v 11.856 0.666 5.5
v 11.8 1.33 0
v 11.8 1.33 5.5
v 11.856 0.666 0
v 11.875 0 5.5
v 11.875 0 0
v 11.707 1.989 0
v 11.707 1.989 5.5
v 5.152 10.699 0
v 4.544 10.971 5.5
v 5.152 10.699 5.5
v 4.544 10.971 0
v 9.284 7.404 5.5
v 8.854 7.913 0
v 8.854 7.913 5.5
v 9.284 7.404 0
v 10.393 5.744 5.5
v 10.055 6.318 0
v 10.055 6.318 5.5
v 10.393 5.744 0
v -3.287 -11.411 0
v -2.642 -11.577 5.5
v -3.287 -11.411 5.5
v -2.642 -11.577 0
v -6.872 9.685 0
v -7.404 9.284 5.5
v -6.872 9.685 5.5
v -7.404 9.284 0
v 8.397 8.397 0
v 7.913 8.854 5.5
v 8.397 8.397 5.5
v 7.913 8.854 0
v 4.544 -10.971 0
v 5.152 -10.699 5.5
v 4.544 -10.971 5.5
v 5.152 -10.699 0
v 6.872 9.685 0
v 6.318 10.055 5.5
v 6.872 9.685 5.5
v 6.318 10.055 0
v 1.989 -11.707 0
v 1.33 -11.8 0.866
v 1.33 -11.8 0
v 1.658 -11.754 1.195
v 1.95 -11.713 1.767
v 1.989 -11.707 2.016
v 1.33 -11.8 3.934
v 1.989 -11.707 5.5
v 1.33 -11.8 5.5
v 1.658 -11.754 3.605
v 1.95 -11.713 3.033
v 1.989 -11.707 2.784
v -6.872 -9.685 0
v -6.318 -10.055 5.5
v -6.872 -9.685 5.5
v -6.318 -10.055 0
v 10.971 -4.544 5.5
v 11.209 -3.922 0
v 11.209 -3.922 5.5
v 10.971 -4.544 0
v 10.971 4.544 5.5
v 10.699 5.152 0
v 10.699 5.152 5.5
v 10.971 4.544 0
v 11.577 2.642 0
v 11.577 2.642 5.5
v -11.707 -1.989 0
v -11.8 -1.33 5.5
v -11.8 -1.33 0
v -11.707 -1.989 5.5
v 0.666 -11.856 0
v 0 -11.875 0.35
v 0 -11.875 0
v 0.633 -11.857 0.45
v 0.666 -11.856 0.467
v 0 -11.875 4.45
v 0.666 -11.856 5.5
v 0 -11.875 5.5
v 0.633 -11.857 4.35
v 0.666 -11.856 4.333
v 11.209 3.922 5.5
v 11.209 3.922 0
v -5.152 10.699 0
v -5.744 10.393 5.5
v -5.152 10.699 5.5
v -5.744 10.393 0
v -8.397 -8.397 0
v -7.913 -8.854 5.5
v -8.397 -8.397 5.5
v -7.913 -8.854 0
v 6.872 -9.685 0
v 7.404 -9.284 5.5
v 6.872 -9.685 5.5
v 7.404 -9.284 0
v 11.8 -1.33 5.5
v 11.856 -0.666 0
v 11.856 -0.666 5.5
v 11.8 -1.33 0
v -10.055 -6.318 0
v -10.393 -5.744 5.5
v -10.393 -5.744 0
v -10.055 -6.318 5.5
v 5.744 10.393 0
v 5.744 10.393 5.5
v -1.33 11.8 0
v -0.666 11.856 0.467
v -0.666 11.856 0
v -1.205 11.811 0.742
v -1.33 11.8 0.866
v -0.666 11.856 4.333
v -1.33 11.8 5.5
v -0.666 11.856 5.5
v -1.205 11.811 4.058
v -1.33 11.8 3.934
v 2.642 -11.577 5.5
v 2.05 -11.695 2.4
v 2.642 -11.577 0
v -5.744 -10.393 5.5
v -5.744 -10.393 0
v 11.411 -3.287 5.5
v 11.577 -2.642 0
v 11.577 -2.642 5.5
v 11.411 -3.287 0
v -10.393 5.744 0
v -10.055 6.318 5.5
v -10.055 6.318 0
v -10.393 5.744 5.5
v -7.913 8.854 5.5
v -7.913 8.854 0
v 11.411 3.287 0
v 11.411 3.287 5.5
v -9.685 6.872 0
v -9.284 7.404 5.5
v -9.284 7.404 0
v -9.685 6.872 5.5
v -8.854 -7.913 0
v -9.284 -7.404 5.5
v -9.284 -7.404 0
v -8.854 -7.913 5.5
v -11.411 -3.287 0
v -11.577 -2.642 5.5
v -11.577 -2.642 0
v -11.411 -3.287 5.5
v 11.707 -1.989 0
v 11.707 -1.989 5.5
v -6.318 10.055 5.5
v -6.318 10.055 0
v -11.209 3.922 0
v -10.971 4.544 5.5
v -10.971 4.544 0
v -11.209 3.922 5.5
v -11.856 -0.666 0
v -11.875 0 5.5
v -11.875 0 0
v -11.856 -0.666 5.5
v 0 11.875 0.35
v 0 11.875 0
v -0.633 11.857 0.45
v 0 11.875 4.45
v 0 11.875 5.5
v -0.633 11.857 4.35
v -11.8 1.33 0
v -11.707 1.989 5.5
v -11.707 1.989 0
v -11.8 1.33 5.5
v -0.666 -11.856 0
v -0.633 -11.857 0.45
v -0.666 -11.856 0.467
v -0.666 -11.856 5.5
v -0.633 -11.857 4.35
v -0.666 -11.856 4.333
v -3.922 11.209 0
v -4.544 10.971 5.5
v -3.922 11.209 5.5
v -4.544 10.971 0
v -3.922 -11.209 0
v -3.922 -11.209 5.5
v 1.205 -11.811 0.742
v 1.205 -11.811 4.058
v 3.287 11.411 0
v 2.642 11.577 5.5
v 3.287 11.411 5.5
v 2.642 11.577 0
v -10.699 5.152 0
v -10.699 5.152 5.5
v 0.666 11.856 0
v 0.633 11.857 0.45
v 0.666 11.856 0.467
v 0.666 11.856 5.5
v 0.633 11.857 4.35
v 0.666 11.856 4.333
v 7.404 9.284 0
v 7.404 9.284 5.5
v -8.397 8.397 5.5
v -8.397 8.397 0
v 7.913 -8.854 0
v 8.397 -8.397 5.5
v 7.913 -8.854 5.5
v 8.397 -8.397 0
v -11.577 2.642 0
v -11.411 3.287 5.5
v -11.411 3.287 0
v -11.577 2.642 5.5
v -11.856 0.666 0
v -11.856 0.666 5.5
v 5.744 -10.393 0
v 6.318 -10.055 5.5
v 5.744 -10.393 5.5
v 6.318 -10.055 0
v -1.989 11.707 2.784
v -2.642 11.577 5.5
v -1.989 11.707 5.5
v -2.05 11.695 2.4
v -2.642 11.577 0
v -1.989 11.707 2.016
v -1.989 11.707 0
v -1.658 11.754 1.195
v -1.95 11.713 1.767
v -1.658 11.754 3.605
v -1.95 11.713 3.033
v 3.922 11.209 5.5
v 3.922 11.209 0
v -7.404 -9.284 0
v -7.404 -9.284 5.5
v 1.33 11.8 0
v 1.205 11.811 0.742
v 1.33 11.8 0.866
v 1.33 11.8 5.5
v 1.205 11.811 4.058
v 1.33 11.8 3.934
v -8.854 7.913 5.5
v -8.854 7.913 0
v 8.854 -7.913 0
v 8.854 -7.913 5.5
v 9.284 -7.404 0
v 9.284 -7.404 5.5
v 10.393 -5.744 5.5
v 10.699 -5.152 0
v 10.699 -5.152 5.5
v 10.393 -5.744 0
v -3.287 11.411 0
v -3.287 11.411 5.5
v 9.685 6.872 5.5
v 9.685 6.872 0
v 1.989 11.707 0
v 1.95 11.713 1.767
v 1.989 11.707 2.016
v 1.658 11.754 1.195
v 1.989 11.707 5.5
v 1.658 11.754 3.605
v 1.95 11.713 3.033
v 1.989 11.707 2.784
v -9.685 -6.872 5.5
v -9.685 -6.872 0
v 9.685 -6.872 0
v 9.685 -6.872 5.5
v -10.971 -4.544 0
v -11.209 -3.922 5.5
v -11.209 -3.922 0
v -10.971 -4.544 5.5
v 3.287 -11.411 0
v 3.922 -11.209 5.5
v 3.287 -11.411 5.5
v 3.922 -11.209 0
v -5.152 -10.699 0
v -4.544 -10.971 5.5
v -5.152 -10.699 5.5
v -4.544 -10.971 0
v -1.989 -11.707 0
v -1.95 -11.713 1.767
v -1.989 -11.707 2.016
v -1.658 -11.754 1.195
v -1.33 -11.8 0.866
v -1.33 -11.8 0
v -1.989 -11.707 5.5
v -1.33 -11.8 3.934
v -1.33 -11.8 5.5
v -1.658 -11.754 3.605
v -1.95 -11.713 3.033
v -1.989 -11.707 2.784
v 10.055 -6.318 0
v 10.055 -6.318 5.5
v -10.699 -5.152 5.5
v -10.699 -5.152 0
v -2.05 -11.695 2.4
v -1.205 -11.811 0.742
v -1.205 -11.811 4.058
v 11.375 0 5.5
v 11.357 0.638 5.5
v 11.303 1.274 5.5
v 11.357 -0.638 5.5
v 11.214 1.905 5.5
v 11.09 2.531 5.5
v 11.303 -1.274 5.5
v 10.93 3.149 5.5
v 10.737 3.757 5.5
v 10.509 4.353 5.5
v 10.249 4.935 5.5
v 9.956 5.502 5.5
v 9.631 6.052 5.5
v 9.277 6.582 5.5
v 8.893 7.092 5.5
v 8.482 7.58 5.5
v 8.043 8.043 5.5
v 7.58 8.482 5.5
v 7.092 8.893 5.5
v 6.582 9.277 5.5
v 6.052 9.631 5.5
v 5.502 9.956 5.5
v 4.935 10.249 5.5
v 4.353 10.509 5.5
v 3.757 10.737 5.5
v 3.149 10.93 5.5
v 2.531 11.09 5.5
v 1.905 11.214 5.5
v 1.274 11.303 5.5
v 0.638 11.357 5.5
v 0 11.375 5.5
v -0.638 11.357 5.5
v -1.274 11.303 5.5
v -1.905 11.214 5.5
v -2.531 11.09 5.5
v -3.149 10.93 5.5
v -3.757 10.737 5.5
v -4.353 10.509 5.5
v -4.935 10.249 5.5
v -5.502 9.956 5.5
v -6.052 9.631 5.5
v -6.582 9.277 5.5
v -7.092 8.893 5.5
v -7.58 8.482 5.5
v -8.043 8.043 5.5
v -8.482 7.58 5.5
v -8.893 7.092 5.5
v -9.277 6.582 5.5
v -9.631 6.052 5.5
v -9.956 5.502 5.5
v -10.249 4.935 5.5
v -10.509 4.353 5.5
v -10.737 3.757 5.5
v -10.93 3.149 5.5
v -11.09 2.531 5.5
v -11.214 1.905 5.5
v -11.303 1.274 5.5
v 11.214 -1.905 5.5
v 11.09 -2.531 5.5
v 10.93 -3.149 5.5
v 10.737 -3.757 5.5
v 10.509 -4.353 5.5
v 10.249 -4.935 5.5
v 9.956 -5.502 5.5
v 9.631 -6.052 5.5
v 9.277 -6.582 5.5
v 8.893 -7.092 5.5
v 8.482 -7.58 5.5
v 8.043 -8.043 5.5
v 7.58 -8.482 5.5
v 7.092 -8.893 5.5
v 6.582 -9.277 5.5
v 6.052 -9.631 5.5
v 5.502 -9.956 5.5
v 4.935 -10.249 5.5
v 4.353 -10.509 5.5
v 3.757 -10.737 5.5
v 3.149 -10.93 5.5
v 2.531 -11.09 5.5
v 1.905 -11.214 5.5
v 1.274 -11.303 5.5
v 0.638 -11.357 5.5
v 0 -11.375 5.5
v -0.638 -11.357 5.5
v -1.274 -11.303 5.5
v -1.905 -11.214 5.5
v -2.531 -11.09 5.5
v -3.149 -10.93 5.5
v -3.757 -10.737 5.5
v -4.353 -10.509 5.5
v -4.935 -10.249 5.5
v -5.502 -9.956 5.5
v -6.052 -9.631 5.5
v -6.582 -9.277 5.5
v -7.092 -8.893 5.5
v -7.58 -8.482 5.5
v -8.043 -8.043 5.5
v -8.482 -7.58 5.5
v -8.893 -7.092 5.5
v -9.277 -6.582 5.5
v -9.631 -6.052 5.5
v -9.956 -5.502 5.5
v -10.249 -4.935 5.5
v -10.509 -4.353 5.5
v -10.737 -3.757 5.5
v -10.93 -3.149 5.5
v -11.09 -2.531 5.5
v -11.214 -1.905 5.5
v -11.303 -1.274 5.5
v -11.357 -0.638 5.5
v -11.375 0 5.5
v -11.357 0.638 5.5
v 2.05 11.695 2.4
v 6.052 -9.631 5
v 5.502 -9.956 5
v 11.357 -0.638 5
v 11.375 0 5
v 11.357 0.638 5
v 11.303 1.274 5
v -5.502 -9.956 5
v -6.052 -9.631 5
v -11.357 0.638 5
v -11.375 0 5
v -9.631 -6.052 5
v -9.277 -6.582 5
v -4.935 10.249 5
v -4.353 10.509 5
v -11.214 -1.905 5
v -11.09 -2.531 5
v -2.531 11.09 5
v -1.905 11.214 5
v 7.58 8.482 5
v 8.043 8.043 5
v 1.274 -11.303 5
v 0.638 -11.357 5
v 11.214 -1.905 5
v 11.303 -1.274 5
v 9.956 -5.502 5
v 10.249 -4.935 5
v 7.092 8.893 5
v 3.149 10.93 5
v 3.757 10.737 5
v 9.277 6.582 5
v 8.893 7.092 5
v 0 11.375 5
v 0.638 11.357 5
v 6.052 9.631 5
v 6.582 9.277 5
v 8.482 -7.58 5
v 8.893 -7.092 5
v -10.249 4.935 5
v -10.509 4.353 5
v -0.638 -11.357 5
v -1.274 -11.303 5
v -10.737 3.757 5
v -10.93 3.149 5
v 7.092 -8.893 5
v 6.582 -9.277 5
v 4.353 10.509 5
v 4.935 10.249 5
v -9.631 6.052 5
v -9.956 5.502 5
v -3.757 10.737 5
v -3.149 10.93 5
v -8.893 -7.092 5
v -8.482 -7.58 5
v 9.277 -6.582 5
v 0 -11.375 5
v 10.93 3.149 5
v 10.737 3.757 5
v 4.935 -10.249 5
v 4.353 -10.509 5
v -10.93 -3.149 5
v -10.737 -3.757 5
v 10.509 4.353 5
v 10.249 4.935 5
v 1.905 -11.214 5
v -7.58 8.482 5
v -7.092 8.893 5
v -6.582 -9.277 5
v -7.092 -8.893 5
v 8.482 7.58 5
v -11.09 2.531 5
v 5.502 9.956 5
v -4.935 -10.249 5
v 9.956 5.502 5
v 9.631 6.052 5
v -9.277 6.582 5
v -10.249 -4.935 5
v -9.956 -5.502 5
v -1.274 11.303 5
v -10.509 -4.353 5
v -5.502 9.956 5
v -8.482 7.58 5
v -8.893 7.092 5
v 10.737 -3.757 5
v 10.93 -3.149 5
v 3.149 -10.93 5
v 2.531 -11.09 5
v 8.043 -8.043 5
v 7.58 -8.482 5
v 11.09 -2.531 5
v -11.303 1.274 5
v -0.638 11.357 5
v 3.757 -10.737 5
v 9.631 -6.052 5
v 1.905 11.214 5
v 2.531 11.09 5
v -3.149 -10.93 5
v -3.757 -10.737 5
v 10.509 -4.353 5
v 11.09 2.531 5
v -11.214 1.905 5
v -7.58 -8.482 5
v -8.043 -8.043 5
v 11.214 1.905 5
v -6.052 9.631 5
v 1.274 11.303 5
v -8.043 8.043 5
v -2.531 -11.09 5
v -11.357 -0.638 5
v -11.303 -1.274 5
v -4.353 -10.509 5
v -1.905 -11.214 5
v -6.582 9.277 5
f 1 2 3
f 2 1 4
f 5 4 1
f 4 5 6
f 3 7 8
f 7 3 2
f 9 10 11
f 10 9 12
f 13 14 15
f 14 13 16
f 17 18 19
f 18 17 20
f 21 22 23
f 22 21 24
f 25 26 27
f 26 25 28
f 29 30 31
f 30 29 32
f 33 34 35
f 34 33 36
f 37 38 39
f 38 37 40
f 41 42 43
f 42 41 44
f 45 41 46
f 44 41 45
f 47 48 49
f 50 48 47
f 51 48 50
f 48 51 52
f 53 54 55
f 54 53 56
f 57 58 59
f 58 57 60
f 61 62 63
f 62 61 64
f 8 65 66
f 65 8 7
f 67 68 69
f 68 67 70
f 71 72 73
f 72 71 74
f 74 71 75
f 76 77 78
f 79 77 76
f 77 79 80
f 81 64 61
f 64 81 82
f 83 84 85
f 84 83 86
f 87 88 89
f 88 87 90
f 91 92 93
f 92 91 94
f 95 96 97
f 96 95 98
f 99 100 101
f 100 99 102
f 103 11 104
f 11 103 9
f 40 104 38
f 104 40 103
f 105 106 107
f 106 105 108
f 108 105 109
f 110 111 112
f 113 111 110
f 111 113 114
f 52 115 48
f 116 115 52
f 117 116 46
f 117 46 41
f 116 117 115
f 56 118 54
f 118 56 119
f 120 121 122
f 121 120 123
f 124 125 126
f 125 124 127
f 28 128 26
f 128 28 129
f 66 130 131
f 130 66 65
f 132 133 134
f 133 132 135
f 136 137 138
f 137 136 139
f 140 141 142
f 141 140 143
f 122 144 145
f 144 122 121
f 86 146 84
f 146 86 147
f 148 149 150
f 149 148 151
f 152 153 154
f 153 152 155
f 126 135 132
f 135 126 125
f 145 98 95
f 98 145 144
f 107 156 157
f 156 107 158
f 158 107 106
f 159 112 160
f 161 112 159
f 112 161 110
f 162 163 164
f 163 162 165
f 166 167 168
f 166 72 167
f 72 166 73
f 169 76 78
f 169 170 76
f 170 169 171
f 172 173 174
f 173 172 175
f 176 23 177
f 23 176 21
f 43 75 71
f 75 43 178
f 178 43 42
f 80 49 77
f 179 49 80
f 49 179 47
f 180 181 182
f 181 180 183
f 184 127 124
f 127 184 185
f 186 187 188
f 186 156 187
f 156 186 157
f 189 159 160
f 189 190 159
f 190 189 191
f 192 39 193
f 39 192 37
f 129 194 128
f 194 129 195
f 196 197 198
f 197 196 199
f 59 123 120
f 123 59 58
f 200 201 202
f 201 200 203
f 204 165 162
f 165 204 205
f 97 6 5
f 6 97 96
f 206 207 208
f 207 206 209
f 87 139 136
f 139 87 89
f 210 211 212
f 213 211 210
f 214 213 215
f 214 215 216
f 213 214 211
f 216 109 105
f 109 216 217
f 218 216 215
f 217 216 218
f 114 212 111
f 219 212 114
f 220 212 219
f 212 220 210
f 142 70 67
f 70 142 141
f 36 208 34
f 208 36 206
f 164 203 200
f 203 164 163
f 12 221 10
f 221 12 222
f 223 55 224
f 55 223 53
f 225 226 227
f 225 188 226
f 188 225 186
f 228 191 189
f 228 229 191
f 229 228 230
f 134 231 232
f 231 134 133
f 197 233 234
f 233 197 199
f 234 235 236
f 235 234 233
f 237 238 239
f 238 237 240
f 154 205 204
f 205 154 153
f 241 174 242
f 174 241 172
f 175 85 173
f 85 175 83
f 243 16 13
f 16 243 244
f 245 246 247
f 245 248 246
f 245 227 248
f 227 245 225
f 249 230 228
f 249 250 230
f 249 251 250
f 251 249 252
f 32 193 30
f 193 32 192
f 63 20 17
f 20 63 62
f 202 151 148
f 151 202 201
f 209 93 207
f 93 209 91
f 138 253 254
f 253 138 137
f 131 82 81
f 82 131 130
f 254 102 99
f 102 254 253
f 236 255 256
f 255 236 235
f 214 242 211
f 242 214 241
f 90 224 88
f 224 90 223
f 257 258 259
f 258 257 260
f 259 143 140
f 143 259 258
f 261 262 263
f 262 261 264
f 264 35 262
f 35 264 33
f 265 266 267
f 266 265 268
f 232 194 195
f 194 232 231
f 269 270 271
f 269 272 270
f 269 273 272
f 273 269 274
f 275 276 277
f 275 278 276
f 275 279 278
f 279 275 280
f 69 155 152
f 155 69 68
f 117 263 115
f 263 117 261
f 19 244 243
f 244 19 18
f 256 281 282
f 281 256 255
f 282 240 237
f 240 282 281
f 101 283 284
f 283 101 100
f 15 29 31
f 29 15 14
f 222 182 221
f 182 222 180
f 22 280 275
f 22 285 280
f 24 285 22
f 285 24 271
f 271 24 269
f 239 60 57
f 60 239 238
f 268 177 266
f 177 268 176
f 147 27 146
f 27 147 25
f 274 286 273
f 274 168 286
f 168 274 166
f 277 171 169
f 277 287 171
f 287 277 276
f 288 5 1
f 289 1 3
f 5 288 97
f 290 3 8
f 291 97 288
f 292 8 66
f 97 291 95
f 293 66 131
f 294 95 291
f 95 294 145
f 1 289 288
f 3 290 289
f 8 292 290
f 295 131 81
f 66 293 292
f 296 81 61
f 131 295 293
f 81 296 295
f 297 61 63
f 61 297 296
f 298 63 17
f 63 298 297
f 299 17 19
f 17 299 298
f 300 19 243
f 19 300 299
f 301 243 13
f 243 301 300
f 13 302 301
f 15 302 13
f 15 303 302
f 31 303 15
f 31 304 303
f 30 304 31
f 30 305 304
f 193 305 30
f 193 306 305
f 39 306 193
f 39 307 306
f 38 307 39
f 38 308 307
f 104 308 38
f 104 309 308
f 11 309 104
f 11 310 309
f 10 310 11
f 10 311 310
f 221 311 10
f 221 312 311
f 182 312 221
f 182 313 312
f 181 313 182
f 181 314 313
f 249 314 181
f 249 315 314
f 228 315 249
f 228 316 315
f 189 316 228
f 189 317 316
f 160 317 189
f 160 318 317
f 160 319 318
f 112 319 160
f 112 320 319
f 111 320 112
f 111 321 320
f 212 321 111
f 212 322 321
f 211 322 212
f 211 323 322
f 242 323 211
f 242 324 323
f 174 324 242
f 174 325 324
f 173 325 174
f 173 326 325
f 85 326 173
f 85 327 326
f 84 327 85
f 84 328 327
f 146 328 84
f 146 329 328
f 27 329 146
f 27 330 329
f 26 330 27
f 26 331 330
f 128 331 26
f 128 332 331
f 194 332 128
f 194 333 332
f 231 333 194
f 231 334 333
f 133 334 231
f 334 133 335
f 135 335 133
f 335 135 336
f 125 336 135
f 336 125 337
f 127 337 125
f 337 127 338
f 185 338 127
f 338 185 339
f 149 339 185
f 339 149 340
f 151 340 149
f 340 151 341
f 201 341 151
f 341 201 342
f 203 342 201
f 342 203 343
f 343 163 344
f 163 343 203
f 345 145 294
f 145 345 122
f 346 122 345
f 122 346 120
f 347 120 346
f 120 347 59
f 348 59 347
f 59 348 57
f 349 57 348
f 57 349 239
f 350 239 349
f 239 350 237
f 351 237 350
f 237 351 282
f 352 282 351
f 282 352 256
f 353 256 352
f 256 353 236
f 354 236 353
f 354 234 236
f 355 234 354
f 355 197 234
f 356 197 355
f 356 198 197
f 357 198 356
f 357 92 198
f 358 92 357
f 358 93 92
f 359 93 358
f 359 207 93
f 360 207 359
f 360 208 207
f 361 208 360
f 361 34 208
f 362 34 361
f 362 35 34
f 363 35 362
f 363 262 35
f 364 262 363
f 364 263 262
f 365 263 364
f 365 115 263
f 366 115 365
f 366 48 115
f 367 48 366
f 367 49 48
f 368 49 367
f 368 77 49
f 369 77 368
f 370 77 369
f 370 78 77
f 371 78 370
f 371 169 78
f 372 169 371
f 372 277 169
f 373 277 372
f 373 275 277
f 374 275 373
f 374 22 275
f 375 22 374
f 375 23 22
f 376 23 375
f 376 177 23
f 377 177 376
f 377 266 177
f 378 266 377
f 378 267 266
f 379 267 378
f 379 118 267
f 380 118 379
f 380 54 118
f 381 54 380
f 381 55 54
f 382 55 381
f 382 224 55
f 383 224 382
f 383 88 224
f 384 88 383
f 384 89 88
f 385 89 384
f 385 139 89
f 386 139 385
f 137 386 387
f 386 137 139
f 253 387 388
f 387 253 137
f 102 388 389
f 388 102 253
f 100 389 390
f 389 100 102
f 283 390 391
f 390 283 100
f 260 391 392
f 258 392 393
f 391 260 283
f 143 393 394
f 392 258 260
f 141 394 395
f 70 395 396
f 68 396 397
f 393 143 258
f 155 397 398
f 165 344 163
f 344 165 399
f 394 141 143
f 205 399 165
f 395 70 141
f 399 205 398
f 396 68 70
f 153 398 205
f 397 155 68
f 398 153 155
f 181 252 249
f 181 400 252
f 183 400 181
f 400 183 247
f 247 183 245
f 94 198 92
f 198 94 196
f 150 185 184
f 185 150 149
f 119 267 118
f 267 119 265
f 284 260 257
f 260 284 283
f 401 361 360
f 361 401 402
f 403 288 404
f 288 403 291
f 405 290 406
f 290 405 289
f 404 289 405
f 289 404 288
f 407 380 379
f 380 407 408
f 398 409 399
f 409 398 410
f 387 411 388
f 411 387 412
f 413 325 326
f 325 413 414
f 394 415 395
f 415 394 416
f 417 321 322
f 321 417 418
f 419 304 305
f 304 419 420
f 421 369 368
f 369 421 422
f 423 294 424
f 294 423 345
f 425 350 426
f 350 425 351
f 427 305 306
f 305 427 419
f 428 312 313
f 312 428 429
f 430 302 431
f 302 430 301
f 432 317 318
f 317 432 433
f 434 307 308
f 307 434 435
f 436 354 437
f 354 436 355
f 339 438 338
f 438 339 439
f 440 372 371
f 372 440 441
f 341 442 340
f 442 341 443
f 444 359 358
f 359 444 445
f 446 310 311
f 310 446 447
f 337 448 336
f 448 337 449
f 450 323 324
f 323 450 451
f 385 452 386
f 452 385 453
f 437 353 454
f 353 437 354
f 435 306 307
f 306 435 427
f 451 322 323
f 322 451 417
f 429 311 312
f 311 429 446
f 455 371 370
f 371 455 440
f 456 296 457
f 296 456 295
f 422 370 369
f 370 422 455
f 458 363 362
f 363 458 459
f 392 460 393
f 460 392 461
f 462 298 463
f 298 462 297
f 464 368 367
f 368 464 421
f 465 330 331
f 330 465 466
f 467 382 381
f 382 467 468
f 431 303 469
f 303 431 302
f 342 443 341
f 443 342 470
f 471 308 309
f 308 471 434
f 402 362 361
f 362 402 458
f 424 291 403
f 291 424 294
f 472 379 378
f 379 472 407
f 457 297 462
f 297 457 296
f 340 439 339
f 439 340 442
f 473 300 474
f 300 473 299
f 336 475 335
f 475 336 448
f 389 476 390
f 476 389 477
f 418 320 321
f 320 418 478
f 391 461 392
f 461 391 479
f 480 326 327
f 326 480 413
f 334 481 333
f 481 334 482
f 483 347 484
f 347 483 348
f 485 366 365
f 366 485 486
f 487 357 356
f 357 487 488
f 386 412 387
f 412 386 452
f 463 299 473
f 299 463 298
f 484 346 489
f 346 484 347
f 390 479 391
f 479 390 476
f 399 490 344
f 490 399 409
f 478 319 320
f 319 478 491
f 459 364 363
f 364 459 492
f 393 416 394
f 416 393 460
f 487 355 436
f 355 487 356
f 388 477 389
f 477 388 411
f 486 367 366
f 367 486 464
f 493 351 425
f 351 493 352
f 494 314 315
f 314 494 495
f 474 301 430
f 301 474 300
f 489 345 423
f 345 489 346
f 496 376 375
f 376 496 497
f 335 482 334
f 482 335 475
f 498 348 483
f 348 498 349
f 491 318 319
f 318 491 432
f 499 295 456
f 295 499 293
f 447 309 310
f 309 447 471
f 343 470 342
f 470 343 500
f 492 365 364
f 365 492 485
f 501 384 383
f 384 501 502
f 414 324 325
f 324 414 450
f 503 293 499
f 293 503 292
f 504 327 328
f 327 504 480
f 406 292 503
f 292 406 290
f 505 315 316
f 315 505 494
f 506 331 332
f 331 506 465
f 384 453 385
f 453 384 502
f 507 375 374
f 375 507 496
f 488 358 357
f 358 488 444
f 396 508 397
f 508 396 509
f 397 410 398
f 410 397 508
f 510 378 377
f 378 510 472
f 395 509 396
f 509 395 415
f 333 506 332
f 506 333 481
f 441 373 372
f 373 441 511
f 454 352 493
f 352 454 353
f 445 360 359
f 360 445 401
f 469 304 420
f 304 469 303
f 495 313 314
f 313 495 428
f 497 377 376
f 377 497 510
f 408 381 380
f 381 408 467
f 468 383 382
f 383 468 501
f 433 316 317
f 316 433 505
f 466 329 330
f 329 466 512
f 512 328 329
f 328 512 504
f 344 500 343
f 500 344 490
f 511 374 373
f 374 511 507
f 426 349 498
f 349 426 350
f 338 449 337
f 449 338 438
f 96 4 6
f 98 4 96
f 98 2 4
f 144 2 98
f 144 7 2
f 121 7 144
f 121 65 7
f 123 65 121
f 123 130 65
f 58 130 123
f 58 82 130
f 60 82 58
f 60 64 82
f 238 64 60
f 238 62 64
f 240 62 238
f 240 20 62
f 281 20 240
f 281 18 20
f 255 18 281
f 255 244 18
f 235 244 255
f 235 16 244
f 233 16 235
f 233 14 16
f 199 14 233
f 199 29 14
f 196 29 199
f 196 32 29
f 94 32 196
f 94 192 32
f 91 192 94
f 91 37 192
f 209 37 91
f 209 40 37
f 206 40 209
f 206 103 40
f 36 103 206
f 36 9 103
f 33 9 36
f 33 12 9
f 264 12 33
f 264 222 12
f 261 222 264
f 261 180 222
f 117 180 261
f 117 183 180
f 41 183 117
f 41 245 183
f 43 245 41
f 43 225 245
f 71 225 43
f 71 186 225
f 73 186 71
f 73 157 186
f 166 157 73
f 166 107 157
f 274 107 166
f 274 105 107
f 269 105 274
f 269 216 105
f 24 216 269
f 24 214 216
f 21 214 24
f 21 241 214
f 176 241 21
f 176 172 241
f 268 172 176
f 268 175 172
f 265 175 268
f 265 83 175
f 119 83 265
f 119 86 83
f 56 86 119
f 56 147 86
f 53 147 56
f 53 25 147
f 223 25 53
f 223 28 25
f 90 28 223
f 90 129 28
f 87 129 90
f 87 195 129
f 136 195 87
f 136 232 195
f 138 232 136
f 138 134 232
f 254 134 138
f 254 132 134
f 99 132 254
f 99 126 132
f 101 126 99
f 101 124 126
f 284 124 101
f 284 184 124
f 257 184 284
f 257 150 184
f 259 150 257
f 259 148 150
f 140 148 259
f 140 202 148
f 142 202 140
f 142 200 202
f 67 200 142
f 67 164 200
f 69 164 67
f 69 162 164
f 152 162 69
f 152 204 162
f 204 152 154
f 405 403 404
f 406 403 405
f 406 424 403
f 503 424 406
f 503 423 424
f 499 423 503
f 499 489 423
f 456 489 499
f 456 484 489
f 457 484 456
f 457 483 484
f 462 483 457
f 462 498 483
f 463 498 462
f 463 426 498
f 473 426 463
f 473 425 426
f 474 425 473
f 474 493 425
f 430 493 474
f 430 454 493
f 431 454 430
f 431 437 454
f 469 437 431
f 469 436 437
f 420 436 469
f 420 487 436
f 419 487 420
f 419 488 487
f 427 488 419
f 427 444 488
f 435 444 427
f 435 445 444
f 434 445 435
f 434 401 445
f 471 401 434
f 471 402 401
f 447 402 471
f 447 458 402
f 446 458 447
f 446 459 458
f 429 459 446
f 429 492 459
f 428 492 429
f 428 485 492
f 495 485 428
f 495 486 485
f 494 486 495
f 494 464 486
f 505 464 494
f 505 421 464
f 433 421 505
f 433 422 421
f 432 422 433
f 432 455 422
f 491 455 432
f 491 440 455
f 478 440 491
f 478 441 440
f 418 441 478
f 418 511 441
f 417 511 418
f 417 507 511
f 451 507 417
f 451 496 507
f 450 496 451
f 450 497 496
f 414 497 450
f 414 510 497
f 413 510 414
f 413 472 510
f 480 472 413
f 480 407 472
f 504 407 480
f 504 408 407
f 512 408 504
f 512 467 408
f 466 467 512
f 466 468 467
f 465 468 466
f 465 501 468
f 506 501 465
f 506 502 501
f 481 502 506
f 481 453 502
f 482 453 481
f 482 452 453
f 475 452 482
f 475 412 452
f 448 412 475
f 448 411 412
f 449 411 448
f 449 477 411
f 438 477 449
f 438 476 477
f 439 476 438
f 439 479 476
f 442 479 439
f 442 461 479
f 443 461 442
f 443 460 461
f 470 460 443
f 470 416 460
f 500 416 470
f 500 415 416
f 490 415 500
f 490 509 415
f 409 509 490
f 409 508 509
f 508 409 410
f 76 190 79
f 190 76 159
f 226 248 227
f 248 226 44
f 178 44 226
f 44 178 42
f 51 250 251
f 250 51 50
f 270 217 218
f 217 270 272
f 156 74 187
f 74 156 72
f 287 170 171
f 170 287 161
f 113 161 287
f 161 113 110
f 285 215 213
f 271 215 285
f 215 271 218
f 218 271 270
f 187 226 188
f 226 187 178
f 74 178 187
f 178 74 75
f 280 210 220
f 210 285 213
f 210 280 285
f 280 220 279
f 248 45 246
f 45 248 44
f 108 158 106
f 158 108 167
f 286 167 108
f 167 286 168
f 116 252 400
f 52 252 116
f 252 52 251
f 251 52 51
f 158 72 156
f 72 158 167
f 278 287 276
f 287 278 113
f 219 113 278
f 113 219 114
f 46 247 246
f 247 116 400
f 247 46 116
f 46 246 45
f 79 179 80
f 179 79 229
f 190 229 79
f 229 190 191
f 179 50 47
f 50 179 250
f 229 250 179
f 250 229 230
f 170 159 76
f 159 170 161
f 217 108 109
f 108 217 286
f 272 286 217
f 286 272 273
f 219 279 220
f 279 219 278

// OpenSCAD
commonHeight=-2.5;
/*
// MINDTHIEF
Tokenize([0,0,5.5],[20,60,0]){
	rotate([180,0,180])
	import("mindthief.stl");
}
// SPELLWEAVER
Tokenize([0,0,5.5],[60,60,0]){
	rotate([180,0,180])
	import("sp.stl");
}
// BRUTE
Tokenize([0,0,5.5],[-60,60,0]){
	rotate([180,0,180])
	import("brute.stl");
}
// TINKERER
Tokenize([0,0,5.5],[-60,-60,0]){
	rotate([180,0,180])
	import("tink.stl");
}
// SCOUNDREL
Tokenize([0,0,5.5],[60,-60,0]){
	rotate([180,0,180])
	import("scoundrel.stl");
}
// CRAGHEART
Tokenize([0,0,5.5],[100,60,0]){
	rotate([180,0,180])
	import("ch.stl");
}
// SUN
Tokenize([126.3,-24.3,commonHeight],[20,20,0]) import("sun.stl");
// PLAUGE HERALD
Tokenize([58.3,-59.3,commonHeight],[-20,20,0]) import("ph.stl");
// SAWBONES
Tokenize([59.3,-23.3,commonHeight],[-20,-20,0]) import("saw.stl");
// THREE SPEARS
Tokenize([26.75,-22.65,commonHeight],[20,-20,0]) import("spears.stl");
// BEAST MASTER
Tokenize([125.375,-96.375,commonHeight],[60,-20,0]) import("twominis.stl");
// LIGHTNING BOLT
Tokenize([90.5,-95.91,commonHeight],[20,-60,0]) import("bolt.stl");
// SOOTHSINGER
Tokenize([91.45,-23.775,commonHeight],[60,20,0]) import("note.stl");
// SUMMONER
Tokenize([25.65,-58.6,commonHeight],[-60,20,0]) import("circles.stl");
// ECLIPSE
Tokenize([90.33,-59.73,commonHeight],[-60,-20,0]) import("eclipse.stl");
// ANGRY FACE
Tokenize([58.44,-95.45,commonHeight],[-20,-60,0]) import("angry.stl");
// TRIANGLES
Tokenize([125.15,-60.2,commonHeight],[-20,60,0]) import("triangles.stl");
*/
// REDGUARD
//Tokenize([-138.55,-89.07,4.4],[100,-20,0]) import("redguard.stl");
// DEMO
//Tokenize([-138.54,-118.76,4.4],[100,20,0])

	
			
//import("redguard.stl")
difference(){
	// base
	union(){
		cylinder(d=23.75,h=5,$fn=112);
		translate([0,0,4])
		difference(){
			cylinder(d=23.75,h=1.5,$fn=112);
			cylinder(d=22.75,h=1.6,$fn=112);
		}
	}

	// string hole
	translate([0,0,2.4])
	rotate([90,90,0])
	cylinder(d=4.1,h=50,center=true,$fn=20);
}
		

module Tokenize(location,newlocation){
	translate(newlocation)
	difference(){
		union(){
			// base
			cylinder(d=23.75,h=4.5,$fn=112);
			// actual token
			translate(location)
			resize([23.75,23.75,1])
			children();
		}
		// string hole
		translate([0,0,2.4])
		rotate([90,90,0])
		cylinder(d=4.1,h=50,center=true,$fn=20);
	}
}
